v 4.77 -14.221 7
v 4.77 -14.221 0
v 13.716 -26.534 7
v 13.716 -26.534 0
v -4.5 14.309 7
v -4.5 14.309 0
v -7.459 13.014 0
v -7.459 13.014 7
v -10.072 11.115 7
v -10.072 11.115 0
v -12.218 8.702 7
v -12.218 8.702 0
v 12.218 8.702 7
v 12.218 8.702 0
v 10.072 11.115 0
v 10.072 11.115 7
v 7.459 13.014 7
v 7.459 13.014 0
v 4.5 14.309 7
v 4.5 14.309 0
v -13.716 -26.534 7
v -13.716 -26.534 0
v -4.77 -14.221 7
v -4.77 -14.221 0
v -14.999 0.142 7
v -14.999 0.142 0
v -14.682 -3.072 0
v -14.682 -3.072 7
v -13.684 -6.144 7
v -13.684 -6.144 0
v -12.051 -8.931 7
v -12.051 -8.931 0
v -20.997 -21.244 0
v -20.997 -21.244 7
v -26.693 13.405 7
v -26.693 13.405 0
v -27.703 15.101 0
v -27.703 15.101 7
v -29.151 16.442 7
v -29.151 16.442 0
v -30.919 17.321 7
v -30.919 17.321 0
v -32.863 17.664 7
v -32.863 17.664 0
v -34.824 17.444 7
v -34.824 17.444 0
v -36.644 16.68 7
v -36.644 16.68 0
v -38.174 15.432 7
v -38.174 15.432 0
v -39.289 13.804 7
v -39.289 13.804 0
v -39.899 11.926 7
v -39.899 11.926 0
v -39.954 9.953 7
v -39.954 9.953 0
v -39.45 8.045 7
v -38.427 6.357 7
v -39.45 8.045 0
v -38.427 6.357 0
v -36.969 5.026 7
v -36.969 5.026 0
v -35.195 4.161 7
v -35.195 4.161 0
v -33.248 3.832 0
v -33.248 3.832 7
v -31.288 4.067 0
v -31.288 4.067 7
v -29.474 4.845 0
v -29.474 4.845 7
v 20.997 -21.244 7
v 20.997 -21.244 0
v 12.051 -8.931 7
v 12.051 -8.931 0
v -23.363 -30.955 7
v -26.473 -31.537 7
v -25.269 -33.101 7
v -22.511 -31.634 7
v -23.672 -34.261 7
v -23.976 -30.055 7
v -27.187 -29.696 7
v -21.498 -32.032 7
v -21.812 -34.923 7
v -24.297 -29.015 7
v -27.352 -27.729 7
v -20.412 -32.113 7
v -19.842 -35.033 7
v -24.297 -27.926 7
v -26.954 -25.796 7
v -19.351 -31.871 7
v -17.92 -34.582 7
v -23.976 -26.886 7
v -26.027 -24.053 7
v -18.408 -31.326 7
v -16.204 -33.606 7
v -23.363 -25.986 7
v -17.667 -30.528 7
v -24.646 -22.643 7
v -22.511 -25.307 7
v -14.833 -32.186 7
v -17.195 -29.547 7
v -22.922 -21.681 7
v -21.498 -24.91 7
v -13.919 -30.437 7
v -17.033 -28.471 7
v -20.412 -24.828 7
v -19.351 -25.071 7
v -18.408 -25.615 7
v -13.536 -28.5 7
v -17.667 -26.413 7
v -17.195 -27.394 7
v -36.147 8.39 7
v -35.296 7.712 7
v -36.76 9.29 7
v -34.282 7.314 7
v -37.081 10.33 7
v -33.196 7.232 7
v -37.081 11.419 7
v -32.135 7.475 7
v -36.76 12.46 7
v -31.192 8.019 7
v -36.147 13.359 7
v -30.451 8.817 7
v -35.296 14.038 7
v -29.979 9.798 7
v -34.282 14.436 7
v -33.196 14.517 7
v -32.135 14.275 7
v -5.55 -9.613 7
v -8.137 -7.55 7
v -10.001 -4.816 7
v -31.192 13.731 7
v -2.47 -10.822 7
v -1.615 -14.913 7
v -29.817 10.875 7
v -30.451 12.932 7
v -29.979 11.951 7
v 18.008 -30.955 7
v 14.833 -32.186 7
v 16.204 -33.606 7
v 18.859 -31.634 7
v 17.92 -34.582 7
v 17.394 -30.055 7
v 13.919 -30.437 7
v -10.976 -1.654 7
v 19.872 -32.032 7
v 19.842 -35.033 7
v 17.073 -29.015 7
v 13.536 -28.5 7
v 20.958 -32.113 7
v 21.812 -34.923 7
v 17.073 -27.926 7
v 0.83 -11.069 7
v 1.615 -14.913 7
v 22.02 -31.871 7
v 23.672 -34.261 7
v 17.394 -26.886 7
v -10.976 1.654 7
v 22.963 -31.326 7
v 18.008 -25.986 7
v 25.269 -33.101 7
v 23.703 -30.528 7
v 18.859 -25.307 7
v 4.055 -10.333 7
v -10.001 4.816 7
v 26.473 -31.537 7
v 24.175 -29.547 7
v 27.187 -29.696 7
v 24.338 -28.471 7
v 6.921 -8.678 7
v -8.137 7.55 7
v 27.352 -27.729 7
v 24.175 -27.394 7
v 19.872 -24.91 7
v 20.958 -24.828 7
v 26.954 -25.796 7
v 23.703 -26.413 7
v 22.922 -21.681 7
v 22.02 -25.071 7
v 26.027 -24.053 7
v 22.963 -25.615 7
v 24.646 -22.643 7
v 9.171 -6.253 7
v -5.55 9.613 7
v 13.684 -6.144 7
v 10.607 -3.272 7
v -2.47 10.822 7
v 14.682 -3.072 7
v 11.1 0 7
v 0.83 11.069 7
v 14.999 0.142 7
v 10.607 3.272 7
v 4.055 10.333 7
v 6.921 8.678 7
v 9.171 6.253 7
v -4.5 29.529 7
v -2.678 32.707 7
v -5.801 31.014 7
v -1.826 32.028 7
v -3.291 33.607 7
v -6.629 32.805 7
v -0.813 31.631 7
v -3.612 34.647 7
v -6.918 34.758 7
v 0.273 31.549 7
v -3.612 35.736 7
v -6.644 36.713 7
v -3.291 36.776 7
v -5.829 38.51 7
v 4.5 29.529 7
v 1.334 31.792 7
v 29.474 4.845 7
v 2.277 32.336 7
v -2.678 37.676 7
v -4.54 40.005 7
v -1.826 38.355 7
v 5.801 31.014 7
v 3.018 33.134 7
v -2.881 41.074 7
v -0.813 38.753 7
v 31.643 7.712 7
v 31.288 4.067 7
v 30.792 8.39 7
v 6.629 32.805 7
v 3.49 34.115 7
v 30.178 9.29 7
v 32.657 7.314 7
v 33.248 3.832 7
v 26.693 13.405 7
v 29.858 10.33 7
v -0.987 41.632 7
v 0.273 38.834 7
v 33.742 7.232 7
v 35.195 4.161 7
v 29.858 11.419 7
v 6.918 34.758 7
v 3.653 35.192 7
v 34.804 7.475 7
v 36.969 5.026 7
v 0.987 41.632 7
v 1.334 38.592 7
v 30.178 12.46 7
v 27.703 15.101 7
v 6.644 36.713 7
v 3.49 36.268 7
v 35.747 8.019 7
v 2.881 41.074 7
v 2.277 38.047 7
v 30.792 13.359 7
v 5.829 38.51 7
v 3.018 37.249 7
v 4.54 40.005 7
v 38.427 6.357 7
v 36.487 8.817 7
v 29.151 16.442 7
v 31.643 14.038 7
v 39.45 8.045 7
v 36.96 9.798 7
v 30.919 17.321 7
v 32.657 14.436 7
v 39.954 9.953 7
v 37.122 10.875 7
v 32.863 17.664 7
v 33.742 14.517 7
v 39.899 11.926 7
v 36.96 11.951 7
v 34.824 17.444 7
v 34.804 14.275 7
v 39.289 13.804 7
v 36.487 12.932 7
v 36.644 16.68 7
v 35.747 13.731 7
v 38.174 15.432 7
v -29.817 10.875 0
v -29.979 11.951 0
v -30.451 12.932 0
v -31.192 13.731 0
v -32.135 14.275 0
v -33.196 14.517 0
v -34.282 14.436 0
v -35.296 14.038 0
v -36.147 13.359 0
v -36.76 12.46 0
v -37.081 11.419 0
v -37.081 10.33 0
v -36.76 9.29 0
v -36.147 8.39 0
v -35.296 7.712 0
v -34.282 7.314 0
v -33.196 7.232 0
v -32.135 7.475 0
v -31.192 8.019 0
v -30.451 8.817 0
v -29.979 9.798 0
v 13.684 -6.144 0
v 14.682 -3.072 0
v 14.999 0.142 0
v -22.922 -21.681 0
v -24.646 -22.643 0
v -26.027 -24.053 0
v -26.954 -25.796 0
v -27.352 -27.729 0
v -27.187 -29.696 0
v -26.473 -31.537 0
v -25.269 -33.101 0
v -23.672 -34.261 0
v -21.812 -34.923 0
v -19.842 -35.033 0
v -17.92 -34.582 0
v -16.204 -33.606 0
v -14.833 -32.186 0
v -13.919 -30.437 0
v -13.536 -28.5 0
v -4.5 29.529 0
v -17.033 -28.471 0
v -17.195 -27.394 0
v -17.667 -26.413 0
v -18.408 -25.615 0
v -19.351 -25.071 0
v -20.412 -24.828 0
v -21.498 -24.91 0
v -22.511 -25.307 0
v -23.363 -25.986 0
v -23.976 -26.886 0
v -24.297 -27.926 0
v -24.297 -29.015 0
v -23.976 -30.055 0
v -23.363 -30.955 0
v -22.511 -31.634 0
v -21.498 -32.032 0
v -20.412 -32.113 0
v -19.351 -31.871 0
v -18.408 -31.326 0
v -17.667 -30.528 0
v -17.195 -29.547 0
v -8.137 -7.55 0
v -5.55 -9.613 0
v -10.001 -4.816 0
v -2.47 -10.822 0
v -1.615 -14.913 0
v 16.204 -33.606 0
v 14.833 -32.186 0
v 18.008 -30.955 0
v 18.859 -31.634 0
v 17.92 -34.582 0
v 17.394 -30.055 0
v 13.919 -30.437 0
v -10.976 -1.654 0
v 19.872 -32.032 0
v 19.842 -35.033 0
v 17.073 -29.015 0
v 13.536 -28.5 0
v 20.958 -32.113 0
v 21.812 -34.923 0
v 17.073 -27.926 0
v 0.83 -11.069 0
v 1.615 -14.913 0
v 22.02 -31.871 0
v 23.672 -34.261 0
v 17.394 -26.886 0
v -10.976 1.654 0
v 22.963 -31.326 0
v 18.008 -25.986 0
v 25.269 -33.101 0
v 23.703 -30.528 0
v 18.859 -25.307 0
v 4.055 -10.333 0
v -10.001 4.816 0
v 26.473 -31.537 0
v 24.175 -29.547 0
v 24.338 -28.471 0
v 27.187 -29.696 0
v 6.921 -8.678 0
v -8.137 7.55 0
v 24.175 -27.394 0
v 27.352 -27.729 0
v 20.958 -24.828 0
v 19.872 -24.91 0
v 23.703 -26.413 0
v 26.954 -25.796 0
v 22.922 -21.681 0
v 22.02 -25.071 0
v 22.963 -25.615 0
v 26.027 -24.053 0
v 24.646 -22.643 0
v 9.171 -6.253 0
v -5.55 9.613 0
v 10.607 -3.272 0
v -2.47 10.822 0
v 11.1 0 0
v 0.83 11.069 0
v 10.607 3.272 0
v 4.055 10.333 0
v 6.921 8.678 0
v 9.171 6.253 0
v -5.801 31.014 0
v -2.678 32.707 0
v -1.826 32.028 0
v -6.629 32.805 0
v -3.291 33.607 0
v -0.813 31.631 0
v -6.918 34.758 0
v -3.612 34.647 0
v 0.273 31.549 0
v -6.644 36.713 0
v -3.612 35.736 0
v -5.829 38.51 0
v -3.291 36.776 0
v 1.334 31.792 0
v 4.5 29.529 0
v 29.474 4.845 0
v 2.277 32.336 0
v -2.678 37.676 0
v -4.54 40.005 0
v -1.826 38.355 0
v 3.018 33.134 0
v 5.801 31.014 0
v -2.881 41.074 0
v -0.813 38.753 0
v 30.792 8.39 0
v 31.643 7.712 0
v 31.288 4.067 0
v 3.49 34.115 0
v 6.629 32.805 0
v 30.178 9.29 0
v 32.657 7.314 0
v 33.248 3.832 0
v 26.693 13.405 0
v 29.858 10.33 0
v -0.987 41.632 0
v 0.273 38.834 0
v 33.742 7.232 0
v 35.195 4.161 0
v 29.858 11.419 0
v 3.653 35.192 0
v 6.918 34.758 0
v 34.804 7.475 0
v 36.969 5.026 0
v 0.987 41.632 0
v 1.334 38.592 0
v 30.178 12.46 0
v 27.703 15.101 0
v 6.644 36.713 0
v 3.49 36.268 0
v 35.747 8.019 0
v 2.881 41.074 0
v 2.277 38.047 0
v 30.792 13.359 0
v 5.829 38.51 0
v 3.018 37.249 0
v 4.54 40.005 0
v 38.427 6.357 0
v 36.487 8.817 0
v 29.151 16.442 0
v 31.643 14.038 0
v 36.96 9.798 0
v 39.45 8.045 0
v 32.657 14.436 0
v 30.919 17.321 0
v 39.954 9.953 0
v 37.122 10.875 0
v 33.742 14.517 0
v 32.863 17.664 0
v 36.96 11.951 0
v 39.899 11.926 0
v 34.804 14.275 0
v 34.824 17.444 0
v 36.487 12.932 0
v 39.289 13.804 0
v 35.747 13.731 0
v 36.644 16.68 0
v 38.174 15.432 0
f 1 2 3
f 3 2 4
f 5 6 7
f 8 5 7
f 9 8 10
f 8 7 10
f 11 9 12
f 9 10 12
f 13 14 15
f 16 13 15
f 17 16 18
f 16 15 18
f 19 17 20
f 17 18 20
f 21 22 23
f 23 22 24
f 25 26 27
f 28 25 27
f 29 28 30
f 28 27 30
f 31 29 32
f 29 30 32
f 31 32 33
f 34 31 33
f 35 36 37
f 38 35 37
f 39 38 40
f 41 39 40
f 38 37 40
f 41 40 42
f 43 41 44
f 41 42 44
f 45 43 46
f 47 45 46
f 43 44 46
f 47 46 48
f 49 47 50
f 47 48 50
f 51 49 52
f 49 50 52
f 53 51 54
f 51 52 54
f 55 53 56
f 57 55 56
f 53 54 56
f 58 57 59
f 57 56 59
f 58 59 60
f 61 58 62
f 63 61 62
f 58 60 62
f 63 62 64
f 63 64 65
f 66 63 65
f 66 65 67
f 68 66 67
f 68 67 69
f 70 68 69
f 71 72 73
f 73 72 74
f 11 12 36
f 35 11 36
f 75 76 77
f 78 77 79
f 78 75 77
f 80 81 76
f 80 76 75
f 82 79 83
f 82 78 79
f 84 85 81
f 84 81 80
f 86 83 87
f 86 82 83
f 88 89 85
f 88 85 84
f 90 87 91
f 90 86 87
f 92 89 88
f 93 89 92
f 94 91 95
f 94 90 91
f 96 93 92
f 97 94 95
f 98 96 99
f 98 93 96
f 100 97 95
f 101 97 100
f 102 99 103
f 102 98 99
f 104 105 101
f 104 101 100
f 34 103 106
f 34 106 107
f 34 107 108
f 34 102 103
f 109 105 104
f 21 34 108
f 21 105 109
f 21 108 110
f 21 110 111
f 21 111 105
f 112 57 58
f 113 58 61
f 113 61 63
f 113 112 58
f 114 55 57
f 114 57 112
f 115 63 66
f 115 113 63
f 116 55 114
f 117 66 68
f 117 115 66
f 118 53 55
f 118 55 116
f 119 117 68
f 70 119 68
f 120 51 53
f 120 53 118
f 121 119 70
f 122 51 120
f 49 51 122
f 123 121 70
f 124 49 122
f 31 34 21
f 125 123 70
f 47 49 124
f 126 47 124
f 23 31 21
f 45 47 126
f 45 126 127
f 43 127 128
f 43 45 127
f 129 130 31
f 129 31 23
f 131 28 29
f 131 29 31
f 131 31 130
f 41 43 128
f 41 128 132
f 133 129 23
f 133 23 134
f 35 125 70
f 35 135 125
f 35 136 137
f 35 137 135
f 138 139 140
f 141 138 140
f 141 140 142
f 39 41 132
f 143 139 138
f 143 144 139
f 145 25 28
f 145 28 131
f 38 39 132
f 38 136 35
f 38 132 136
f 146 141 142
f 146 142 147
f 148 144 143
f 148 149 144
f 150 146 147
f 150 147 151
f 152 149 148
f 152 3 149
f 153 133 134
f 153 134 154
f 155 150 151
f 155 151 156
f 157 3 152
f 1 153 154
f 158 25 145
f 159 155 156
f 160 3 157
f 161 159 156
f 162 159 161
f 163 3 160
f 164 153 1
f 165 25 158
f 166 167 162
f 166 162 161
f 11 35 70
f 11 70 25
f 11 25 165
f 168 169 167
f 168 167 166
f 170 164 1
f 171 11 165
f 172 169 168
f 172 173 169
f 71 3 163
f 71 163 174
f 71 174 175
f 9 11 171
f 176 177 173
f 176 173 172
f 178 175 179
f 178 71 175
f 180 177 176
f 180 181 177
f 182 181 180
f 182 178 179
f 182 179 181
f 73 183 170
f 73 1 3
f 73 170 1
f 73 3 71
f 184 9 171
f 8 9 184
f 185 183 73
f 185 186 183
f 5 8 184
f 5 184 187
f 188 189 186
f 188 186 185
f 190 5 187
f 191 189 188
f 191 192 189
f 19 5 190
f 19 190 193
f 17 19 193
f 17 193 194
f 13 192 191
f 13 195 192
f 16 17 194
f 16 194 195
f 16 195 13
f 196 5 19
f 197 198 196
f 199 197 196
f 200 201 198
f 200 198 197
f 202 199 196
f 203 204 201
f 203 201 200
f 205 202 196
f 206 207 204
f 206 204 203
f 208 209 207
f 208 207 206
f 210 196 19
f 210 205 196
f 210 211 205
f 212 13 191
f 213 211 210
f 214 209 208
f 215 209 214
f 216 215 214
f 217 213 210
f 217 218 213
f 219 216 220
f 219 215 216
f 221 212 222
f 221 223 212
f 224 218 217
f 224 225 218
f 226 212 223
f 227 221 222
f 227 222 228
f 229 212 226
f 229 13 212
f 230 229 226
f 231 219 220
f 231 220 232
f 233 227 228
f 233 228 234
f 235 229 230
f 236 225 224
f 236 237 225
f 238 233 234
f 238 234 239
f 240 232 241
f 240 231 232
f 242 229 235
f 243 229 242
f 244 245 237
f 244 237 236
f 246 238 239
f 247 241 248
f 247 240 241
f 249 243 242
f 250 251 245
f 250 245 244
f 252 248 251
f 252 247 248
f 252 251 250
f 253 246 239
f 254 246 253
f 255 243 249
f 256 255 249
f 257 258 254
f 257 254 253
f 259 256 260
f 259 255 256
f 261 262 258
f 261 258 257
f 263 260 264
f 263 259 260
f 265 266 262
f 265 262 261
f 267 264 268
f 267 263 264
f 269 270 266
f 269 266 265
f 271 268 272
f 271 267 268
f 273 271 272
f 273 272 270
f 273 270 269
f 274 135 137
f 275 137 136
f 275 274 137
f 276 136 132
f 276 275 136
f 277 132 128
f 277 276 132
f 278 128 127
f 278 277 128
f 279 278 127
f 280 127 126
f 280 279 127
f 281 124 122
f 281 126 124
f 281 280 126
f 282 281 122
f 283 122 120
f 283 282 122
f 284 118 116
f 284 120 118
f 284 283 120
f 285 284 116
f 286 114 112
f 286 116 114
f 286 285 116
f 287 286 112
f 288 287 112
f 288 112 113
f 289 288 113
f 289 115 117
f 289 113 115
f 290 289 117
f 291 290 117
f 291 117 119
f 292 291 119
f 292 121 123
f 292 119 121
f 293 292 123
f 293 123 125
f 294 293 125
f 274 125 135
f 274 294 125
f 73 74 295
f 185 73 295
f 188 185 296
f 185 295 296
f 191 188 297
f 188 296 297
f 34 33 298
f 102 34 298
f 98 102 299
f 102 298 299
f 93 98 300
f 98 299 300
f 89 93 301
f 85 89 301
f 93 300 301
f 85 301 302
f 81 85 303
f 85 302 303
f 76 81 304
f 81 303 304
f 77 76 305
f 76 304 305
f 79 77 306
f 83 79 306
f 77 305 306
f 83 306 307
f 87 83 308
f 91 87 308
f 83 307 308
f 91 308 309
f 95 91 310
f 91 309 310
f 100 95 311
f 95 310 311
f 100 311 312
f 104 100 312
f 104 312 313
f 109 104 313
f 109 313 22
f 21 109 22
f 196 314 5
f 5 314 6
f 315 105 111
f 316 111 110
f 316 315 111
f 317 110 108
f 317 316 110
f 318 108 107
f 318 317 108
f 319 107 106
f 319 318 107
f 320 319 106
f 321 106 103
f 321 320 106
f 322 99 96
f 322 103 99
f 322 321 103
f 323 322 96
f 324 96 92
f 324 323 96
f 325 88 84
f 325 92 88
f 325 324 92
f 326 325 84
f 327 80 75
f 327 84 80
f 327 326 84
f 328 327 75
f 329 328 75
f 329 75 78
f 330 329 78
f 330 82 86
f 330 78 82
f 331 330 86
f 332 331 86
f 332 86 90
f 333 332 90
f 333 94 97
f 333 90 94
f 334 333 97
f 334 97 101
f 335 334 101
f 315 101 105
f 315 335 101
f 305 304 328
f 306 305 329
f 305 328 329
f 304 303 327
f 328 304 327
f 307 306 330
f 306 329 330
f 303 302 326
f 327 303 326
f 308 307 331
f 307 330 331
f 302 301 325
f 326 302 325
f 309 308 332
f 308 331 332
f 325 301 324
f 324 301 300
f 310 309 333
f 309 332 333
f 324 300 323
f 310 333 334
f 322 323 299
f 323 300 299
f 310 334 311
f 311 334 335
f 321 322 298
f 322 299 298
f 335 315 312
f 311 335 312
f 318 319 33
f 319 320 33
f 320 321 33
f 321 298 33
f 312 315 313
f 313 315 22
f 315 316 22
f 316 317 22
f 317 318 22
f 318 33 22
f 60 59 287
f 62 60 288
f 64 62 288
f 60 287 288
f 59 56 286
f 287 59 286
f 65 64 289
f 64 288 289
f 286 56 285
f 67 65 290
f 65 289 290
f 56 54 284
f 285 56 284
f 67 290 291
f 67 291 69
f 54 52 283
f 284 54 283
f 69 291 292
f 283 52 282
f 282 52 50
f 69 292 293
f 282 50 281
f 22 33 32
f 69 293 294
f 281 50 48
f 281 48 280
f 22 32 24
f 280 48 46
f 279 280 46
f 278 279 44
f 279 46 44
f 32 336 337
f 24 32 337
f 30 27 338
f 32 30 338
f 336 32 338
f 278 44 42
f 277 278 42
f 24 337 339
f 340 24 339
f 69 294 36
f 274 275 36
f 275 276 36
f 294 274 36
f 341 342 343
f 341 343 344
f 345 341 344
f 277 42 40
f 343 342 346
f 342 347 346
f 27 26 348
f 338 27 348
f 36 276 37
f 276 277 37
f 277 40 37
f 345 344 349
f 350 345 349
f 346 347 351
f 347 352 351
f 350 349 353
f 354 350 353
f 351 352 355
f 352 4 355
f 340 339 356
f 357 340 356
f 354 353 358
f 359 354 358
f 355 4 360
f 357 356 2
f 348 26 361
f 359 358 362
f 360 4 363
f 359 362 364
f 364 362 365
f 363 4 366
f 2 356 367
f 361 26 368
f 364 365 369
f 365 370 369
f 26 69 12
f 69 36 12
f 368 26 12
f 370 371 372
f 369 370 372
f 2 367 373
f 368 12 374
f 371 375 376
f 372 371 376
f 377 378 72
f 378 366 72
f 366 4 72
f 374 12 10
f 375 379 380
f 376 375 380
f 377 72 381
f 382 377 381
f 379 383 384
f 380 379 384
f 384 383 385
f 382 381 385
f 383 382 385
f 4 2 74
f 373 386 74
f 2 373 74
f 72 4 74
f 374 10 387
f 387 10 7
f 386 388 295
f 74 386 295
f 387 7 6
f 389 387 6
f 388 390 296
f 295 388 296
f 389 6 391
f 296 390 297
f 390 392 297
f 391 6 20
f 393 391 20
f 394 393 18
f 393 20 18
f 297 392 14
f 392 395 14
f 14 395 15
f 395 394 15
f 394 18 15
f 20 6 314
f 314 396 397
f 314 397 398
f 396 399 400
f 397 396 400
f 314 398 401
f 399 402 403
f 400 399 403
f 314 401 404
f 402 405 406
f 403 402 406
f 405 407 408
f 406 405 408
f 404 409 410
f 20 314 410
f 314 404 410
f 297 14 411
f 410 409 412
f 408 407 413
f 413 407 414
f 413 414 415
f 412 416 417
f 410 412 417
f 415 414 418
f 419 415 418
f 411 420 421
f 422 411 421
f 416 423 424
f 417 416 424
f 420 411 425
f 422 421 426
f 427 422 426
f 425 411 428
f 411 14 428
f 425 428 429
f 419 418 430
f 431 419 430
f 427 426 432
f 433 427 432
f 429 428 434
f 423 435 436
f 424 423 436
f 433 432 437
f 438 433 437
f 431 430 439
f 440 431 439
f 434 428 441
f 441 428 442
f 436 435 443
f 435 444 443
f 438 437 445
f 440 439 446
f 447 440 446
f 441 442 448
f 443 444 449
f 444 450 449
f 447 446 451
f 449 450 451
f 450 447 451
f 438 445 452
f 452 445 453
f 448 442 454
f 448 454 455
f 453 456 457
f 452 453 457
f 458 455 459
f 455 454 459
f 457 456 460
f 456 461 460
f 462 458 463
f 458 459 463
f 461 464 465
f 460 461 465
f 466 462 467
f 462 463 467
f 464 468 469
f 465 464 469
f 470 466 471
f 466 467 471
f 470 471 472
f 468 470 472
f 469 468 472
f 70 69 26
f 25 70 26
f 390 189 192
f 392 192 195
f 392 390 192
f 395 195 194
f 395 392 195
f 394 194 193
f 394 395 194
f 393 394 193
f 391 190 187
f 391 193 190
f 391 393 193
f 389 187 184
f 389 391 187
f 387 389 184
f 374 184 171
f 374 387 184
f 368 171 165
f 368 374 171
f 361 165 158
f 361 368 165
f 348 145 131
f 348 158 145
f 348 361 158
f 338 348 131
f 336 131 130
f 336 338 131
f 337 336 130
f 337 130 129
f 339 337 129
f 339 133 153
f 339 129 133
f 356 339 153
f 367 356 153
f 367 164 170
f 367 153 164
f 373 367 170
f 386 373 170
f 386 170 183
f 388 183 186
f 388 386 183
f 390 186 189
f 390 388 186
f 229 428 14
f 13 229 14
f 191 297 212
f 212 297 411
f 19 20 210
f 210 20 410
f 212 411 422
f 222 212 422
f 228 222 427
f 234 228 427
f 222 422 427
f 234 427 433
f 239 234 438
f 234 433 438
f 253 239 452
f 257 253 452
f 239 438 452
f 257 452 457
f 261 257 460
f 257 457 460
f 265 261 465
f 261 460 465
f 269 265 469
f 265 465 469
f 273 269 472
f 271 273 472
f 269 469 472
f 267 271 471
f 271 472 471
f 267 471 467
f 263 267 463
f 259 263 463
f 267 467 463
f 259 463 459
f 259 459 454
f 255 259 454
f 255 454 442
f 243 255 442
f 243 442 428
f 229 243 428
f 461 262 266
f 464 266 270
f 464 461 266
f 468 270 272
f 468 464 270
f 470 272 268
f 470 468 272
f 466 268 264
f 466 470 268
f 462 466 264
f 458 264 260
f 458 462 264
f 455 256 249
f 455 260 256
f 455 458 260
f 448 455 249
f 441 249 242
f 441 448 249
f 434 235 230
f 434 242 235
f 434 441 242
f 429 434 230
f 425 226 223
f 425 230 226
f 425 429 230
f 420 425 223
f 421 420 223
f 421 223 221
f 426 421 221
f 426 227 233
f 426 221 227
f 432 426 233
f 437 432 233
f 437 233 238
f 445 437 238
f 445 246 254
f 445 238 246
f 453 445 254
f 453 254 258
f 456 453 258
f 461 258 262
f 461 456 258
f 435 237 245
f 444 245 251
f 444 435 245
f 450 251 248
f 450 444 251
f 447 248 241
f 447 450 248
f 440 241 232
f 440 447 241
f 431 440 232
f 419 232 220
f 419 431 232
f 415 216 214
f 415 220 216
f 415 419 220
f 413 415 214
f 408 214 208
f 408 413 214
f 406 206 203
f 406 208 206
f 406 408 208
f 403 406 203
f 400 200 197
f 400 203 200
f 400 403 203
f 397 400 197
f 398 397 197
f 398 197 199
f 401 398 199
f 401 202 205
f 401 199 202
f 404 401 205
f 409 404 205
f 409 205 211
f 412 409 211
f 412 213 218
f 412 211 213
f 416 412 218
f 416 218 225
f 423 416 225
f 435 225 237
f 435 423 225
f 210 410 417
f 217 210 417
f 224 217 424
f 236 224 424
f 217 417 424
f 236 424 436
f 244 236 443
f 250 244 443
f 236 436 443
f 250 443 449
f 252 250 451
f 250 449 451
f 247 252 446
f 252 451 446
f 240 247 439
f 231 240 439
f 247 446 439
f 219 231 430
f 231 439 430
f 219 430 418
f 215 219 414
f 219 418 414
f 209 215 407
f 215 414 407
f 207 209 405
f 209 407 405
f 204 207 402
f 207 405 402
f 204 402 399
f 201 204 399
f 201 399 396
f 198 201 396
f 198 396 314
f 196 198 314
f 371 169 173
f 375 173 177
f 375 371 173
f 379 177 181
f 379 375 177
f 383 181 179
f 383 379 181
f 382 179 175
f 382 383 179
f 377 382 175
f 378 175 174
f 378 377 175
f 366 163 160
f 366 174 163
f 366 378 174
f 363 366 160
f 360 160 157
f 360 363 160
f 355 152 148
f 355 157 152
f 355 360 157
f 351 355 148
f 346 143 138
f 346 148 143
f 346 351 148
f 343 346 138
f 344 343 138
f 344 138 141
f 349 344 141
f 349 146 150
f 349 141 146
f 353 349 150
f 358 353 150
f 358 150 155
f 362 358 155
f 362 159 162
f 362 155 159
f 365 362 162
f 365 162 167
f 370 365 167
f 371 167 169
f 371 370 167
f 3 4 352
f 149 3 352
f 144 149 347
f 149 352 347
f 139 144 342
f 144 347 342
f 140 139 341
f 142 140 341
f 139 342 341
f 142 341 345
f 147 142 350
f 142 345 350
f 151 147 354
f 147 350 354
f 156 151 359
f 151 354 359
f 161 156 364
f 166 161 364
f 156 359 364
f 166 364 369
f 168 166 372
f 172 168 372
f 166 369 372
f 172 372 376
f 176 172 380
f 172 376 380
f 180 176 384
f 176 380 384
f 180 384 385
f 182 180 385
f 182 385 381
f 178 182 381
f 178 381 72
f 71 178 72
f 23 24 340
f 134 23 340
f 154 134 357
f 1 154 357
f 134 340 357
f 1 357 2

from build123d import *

# Parameters (mm, degrees)
F2_DEPTH = 7
F0_R     = 11.1
F3_DEPTH = 7.001
F4_R     = 3.652579
F5_DEPTH = 7.001


with BuildPart() as f2:
    # F1 (on Top) → F2 (new body)
    with BuildSketch(Plane.XY):
        with BuildLine():
            Line((-4.5, 29.528995), (-4.5, 14.309088))
            ThreePointArc((-4.5, 14.309088), (-8.816779, 12.135255), (-12.218175, 8.701506))
            Line((-12.218175, 8.701506), (-26.693166, 13.404716))
            ThreePointArc((-26.693166, 13.404716), (-39.661387, 12.886766), (-29.474319, 4.845207))
            Line((-29.474319, 4.845207), (-14.999328, 0.141997))
            ThreePointArc((-14.999328, 0.141997), (-14.265848, -4.635255), (-12.051247, -8.931262))
            Line((-12.051247, -8.931262), (-20.997284, -21.244425))
            ThreePointArc((-20.997284, -21.244425), (-24.512085, -33.737991), (-13.716131, -26.534492))
            Line((-13.716131, -26.534492), (-4.770094, -14.221329))
            ThreePointArc((-4.770094, -14.221329), (0, -15), (4.770094, -14.221329))
            Line((4.770094, -14.221329), (13.716131, -26.534492))
            ThreePointArc((13.716131, -26.534492), (24.512085, -33.737991), (20.997284, -21.244425))
            Line((20.997284, -21.244425), (12.051247, -8.931262))
            ThreePointArc((12.051247, -8.931262), (14.265848, -4.635255), (14.999328, 0.141997))
            Line((14.999328, 0.141997), (29.474319, 4.845207))
            ThreePointArc((29.474319, 4.845207), (39.661387, 12.886766), (26.693166, 13.404716))
            Line((26.693166, 13.404716), (12.218175, 8.701506))
            ThreePointArc((12.218175, 8.701506), (8.816779, 12.135255), (4.5, 14.309088))
            Line((4.5, 14.309088), (4.5, 29.528995))
            ThreePointArc((4.5, 29.528995), (0, 41.70245), (-4.5, 29.528995))
        make_face()
    extrude(amount=F2_DEPTH)

    # F0 (on Top) → F3 (cut, through all)
    with BuildSketch(Plane.XY):
        Circle(F0_R)
    extrude(amount=F3_DEPTH, mode=Mode.SUBTRACT)

    # F4 (on Top) → F5 (cut, through all)
    with BuildSketch(Plane.XY):
        with Locations((0, 35.191689)):
            Circle(F4_R)
        with Locations((-33.469285, 10.87483)):
            Circle(F4_R)
        with Locations((-20.685156, -28.470674)):
            Circle(F4_R)
        with Locations((20.685156, -28.470674)):
            Circle(F4_R)
        with Locations((33.469285, 10.87483)):
            Circle(F4_R)
    extrude(amount=F5_DEPTH, mode=Mode.SUBTRACT)


solid = f2.part
